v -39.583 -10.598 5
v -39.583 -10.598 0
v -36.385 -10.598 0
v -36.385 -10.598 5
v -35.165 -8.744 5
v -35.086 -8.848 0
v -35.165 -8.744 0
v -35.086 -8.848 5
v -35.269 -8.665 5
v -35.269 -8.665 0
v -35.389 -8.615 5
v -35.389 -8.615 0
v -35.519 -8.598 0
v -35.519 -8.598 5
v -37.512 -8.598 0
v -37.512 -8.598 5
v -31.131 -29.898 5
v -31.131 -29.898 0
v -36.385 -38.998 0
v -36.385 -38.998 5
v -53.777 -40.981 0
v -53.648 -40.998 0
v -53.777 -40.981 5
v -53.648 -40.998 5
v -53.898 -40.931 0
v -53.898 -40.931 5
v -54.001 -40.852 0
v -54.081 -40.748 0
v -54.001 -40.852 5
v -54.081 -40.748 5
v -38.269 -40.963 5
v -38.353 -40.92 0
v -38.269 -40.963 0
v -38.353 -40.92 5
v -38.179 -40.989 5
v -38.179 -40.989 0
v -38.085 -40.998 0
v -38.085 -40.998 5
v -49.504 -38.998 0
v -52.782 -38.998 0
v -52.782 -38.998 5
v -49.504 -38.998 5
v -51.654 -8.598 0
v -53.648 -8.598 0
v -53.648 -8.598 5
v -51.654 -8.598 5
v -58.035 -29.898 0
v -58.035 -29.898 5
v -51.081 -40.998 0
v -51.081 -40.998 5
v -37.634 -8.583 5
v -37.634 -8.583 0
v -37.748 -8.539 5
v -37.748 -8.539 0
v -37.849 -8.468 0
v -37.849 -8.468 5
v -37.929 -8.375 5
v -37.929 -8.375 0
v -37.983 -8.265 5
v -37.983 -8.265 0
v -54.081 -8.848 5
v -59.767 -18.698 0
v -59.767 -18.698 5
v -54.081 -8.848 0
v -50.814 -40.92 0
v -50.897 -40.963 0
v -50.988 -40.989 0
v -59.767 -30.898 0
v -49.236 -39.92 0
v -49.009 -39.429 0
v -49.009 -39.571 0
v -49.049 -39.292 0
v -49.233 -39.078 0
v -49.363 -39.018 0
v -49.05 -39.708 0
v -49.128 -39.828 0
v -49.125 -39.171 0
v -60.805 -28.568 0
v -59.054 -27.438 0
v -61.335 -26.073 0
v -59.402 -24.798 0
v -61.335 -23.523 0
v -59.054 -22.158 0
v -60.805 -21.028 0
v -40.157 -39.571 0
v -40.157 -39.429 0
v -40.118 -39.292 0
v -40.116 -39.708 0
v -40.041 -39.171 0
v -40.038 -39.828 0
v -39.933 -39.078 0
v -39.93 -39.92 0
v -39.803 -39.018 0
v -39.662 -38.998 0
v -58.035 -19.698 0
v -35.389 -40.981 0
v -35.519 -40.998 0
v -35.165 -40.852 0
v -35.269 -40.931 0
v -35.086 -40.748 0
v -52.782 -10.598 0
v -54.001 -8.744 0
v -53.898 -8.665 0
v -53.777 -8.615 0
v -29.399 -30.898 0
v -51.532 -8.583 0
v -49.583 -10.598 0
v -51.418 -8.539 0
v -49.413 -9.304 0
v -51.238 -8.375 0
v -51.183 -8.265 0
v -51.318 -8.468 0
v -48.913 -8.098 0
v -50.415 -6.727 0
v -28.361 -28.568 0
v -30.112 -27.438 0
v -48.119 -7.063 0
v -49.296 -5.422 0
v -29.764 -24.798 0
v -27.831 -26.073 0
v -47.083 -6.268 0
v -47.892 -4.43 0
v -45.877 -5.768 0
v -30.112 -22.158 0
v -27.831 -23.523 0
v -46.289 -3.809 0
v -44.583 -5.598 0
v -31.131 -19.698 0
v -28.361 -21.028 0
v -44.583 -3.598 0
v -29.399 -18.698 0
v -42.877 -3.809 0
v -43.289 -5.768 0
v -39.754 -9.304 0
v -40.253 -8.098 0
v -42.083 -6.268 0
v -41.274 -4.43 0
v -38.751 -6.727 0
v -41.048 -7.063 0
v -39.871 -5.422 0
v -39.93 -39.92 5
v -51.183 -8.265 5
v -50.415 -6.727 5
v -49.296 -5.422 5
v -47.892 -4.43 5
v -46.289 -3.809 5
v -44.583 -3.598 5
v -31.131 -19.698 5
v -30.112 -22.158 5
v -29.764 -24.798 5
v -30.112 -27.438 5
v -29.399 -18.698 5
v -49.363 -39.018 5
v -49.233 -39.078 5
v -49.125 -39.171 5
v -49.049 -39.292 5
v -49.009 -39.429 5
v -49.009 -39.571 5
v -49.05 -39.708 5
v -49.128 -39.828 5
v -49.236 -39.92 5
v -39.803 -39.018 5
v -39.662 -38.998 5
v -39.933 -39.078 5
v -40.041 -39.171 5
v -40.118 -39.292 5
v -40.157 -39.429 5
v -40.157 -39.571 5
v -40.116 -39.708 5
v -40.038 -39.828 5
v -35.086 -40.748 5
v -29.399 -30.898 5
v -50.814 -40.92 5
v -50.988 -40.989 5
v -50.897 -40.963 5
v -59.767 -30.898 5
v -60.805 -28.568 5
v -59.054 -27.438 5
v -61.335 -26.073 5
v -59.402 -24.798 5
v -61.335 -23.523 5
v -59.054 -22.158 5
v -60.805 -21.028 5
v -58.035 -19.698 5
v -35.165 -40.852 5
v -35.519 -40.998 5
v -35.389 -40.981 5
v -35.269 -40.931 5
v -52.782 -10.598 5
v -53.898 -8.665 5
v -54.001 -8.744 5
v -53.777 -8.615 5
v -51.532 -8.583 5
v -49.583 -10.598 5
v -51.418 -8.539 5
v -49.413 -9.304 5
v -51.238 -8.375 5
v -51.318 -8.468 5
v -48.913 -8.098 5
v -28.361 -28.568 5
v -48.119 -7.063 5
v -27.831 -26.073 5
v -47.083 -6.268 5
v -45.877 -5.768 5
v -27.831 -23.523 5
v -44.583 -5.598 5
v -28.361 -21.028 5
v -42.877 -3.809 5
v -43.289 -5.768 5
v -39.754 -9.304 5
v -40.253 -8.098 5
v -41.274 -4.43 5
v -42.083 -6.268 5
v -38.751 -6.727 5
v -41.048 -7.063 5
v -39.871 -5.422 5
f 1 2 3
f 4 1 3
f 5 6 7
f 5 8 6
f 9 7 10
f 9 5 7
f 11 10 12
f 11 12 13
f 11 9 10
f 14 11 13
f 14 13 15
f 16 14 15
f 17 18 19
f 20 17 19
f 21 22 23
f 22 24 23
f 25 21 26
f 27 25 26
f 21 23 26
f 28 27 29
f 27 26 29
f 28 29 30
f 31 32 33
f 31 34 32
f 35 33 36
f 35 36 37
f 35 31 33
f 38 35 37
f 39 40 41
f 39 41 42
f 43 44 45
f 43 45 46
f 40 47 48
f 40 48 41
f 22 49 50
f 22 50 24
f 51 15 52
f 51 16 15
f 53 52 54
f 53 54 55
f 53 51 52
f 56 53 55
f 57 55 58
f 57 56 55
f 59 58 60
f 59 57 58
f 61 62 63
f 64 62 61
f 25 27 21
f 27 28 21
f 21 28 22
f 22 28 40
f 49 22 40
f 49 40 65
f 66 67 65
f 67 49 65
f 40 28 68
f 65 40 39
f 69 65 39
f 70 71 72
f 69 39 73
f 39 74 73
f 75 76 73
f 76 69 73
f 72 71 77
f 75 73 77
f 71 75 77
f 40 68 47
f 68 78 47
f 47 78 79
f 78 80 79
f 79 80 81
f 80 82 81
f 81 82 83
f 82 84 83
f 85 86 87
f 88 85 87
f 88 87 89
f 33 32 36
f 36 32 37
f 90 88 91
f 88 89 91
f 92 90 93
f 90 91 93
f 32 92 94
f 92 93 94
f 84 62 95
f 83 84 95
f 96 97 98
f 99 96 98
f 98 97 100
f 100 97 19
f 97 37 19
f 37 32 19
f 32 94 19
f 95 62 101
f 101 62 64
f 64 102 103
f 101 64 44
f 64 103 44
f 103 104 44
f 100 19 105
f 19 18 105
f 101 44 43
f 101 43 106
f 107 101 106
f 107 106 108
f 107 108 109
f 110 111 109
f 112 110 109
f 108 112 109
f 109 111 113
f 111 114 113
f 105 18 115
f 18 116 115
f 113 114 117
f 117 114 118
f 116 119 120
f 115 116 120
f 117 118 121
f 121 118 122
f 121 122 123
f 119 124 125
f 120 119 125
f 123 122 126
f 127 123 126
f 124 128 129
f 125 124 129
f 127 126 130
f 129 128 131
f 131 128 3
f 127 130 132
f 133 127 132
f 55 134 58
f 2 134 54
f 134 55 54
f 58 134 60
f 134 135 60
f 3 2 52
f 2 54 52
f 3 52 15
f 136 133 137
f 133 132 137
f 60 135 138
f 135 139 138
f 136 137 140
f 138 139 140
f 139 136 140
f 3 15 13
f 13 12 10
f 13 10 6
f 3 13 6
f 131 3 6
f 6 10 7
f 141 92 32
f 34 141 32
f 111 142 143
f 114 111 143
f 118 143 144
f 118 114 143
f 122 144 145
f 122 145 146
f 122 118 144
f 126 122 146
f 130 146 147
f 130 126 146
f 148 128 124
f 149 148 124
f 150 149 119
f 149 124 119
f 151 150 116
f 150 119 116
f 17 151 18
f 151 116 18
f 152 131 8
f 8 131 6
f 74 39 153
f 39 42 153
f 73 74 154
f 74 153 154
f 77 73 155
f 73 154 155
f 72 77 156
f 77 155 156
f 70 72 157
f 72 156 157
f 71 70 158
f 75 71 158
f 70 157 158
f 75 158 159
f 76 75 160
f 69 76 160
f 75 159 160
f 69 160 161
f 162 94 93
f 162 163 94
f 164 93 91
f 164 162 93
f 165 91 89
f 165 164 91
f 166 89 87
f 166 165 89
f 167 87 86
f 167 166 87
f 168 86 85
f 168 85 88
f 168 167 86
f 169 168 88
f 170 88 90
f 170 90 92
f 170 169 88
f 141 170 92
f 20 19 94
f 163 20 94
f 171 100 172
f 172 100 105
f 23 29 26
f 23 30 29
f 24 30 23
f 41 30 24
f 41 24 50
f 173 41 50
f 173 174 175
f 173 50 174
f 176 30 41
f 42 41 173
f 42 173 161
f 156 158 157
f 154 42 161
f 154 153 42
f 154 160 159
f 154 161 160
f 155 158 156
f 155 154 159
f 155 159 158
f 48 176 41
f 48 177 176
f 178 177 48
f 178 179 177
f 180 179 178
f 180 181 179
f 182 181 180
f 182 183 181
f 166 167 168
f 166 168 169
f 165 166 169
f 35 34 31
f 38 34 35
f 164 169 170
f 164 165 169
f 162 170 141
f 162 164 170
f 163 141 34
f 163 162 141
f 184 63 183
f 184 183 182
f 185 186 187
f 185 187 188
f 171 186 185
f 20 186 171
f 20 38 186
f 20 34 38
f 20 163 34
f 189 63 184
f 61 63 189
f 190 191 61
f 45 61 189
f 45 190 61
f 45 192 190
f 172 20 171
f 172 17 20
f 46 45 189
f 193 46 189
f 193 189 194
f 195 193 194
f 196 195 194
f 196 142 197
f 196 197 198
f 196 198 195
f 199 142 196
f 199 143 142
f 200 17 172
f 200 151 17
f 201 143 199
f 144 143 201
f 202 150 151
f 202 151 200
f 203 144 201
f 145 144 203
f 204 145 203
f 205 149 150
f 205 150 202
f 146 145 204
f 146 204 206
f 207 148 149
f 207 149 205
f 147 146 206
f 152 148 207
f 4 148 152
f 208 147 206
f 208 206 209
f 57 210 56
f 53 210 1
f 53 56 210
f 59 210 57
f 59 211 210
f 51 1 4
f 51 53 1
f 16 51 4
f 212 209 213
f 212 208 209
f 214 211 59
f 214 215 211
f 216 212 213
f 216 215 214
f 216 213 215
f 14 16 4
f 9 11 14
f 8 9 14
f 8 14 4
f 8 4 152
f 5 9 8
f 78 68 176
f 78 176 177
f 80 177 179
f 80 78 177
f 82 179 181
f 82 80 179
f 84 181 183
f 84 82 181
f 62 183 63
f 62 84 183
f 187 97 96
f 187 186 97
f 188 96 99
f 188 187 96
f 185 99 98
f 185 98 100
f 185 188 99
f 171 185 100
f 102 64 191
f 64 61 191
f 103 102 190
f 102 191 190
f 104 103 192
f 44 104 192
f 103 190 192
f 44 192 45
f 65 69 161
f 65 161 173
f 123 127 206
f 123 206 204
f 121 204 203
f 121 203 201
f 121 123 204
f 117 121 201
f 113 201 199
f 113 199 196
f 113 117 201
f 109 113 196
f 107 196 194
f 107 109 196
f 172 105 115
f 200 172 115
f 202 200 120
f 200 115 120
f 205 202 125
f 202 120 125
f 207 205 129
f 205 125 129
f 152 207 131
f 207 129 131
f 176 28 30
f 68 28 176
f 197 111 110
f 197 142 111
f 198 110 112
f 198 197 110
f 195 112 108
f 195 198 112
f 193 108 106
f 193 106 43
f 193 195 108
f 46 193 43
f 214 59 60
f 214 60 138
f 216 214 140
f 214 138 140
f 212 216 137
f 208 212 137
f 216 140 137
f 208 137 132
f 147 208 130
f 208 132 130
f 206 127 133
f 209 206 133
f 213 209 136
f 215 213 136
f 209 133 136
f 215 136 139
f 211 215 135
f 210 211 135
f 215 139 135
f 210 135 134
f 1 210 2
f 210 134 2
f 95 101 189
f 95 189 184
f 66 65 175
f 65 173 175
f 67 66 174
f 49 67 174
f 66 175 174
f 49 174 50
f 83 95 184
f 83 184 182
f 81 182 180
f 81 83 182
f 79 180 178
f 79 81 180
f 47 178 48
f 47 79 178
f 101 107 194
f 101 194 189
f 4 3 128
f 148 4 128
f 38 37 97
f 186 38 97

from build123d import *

# Parameters (mm, degrees)
BOSS_EXTRUDE1_DEPTH = 5
FILLET1_R           = 0.5


with BuildPart() as part:
    # Sketch1 → Boss-Extrude1 (new body)
    with BuildSketch(Plane.XY):
        with BuildLine():
            Line((-58.035421321, -29.898049549), (-52.781533871, -38.998049549))
            Line((-52.781533871, -38.998049549), (-47.781533871, -38.998049549))
            Line((-47.781533871, -38.998049549), (-50.93623441, -40.998049549))
            Line((-50.93623441, -40.998049549), (-53.93623441, -40.998049549))
            Line((-53.93623441, -40.998049549), (-59.767472129, -30.898049549))
            ThreePointArc((-59.767472129, -30.898049549), (-61.401962202, -24.798049549), (-59.767472129, -18.698049549))
            Line((-59.767472129, -18.698049549), (-53.93623441, -8.598049549))
            Line((-53.93623441, -8.598049549), (-51.291363981, -8.598049549))
            ThreePointArc((-51.291363981, -8.598049549), (-48.766460182, -4.985563469), (-44.583160049, -3.598049549))
            Line((-44.583160049, -3.598049549), (-44.583160049, -5.598049549))
            ThreePointArc((-44.583160049, -5.598049549), (-48.118693955, -7.062515643), (-49.583160049, -10.598049549))
            Line((-49.583160049, -10.598049549), (-52.781533871, -10.598049549))
            Line((-52.781533871, -10.598049549), (-58.035421321, -19.698049549))
            ThreePointArc((-58.035421321, -19.698049549), (-59.401962202, -24.798049549), (-58.035421321, -29.898049549))
        make_face()
    boss_extrude1 = extrude(amount=BOSS_EXTRUDE1_DEPTH)

    # Mirror1: Boss-Extrude1 across plane
    add(boss_extrude1.mirror(Plane(origin=(-44.583160049, -5.598049549, 5), x_dir=(0, 0, 1), z_dir=(-1, 0, 0))))

    # Fillet1
    fillet1_edges = [part.edges().sort_by_distance(p)[0] for p in [
        (-47.781533871, -38.998049549, 2.5),
        (-50.93623441, -40.998049549, 2.5),
        (-53.93623441, -40.998049549, 2.5),
        (-53.93623441, -8.598049549, 2.5),
        (-51.291363981, -8.598049549, 2.5),
        (-41.384786226, -38.998049549, 2.5),
        (-38.230085688, -40.998049549, 2.5),
        (-35.230085688, -40.998049549, 2.5),
        (-35.230085688, -8.598049549, 2.5),
        (-37.874956116, -8.598049549, 2.5),
    ]]
    fillet(fillet1_edges, radius=FILLET1_R)


solid = part.part
